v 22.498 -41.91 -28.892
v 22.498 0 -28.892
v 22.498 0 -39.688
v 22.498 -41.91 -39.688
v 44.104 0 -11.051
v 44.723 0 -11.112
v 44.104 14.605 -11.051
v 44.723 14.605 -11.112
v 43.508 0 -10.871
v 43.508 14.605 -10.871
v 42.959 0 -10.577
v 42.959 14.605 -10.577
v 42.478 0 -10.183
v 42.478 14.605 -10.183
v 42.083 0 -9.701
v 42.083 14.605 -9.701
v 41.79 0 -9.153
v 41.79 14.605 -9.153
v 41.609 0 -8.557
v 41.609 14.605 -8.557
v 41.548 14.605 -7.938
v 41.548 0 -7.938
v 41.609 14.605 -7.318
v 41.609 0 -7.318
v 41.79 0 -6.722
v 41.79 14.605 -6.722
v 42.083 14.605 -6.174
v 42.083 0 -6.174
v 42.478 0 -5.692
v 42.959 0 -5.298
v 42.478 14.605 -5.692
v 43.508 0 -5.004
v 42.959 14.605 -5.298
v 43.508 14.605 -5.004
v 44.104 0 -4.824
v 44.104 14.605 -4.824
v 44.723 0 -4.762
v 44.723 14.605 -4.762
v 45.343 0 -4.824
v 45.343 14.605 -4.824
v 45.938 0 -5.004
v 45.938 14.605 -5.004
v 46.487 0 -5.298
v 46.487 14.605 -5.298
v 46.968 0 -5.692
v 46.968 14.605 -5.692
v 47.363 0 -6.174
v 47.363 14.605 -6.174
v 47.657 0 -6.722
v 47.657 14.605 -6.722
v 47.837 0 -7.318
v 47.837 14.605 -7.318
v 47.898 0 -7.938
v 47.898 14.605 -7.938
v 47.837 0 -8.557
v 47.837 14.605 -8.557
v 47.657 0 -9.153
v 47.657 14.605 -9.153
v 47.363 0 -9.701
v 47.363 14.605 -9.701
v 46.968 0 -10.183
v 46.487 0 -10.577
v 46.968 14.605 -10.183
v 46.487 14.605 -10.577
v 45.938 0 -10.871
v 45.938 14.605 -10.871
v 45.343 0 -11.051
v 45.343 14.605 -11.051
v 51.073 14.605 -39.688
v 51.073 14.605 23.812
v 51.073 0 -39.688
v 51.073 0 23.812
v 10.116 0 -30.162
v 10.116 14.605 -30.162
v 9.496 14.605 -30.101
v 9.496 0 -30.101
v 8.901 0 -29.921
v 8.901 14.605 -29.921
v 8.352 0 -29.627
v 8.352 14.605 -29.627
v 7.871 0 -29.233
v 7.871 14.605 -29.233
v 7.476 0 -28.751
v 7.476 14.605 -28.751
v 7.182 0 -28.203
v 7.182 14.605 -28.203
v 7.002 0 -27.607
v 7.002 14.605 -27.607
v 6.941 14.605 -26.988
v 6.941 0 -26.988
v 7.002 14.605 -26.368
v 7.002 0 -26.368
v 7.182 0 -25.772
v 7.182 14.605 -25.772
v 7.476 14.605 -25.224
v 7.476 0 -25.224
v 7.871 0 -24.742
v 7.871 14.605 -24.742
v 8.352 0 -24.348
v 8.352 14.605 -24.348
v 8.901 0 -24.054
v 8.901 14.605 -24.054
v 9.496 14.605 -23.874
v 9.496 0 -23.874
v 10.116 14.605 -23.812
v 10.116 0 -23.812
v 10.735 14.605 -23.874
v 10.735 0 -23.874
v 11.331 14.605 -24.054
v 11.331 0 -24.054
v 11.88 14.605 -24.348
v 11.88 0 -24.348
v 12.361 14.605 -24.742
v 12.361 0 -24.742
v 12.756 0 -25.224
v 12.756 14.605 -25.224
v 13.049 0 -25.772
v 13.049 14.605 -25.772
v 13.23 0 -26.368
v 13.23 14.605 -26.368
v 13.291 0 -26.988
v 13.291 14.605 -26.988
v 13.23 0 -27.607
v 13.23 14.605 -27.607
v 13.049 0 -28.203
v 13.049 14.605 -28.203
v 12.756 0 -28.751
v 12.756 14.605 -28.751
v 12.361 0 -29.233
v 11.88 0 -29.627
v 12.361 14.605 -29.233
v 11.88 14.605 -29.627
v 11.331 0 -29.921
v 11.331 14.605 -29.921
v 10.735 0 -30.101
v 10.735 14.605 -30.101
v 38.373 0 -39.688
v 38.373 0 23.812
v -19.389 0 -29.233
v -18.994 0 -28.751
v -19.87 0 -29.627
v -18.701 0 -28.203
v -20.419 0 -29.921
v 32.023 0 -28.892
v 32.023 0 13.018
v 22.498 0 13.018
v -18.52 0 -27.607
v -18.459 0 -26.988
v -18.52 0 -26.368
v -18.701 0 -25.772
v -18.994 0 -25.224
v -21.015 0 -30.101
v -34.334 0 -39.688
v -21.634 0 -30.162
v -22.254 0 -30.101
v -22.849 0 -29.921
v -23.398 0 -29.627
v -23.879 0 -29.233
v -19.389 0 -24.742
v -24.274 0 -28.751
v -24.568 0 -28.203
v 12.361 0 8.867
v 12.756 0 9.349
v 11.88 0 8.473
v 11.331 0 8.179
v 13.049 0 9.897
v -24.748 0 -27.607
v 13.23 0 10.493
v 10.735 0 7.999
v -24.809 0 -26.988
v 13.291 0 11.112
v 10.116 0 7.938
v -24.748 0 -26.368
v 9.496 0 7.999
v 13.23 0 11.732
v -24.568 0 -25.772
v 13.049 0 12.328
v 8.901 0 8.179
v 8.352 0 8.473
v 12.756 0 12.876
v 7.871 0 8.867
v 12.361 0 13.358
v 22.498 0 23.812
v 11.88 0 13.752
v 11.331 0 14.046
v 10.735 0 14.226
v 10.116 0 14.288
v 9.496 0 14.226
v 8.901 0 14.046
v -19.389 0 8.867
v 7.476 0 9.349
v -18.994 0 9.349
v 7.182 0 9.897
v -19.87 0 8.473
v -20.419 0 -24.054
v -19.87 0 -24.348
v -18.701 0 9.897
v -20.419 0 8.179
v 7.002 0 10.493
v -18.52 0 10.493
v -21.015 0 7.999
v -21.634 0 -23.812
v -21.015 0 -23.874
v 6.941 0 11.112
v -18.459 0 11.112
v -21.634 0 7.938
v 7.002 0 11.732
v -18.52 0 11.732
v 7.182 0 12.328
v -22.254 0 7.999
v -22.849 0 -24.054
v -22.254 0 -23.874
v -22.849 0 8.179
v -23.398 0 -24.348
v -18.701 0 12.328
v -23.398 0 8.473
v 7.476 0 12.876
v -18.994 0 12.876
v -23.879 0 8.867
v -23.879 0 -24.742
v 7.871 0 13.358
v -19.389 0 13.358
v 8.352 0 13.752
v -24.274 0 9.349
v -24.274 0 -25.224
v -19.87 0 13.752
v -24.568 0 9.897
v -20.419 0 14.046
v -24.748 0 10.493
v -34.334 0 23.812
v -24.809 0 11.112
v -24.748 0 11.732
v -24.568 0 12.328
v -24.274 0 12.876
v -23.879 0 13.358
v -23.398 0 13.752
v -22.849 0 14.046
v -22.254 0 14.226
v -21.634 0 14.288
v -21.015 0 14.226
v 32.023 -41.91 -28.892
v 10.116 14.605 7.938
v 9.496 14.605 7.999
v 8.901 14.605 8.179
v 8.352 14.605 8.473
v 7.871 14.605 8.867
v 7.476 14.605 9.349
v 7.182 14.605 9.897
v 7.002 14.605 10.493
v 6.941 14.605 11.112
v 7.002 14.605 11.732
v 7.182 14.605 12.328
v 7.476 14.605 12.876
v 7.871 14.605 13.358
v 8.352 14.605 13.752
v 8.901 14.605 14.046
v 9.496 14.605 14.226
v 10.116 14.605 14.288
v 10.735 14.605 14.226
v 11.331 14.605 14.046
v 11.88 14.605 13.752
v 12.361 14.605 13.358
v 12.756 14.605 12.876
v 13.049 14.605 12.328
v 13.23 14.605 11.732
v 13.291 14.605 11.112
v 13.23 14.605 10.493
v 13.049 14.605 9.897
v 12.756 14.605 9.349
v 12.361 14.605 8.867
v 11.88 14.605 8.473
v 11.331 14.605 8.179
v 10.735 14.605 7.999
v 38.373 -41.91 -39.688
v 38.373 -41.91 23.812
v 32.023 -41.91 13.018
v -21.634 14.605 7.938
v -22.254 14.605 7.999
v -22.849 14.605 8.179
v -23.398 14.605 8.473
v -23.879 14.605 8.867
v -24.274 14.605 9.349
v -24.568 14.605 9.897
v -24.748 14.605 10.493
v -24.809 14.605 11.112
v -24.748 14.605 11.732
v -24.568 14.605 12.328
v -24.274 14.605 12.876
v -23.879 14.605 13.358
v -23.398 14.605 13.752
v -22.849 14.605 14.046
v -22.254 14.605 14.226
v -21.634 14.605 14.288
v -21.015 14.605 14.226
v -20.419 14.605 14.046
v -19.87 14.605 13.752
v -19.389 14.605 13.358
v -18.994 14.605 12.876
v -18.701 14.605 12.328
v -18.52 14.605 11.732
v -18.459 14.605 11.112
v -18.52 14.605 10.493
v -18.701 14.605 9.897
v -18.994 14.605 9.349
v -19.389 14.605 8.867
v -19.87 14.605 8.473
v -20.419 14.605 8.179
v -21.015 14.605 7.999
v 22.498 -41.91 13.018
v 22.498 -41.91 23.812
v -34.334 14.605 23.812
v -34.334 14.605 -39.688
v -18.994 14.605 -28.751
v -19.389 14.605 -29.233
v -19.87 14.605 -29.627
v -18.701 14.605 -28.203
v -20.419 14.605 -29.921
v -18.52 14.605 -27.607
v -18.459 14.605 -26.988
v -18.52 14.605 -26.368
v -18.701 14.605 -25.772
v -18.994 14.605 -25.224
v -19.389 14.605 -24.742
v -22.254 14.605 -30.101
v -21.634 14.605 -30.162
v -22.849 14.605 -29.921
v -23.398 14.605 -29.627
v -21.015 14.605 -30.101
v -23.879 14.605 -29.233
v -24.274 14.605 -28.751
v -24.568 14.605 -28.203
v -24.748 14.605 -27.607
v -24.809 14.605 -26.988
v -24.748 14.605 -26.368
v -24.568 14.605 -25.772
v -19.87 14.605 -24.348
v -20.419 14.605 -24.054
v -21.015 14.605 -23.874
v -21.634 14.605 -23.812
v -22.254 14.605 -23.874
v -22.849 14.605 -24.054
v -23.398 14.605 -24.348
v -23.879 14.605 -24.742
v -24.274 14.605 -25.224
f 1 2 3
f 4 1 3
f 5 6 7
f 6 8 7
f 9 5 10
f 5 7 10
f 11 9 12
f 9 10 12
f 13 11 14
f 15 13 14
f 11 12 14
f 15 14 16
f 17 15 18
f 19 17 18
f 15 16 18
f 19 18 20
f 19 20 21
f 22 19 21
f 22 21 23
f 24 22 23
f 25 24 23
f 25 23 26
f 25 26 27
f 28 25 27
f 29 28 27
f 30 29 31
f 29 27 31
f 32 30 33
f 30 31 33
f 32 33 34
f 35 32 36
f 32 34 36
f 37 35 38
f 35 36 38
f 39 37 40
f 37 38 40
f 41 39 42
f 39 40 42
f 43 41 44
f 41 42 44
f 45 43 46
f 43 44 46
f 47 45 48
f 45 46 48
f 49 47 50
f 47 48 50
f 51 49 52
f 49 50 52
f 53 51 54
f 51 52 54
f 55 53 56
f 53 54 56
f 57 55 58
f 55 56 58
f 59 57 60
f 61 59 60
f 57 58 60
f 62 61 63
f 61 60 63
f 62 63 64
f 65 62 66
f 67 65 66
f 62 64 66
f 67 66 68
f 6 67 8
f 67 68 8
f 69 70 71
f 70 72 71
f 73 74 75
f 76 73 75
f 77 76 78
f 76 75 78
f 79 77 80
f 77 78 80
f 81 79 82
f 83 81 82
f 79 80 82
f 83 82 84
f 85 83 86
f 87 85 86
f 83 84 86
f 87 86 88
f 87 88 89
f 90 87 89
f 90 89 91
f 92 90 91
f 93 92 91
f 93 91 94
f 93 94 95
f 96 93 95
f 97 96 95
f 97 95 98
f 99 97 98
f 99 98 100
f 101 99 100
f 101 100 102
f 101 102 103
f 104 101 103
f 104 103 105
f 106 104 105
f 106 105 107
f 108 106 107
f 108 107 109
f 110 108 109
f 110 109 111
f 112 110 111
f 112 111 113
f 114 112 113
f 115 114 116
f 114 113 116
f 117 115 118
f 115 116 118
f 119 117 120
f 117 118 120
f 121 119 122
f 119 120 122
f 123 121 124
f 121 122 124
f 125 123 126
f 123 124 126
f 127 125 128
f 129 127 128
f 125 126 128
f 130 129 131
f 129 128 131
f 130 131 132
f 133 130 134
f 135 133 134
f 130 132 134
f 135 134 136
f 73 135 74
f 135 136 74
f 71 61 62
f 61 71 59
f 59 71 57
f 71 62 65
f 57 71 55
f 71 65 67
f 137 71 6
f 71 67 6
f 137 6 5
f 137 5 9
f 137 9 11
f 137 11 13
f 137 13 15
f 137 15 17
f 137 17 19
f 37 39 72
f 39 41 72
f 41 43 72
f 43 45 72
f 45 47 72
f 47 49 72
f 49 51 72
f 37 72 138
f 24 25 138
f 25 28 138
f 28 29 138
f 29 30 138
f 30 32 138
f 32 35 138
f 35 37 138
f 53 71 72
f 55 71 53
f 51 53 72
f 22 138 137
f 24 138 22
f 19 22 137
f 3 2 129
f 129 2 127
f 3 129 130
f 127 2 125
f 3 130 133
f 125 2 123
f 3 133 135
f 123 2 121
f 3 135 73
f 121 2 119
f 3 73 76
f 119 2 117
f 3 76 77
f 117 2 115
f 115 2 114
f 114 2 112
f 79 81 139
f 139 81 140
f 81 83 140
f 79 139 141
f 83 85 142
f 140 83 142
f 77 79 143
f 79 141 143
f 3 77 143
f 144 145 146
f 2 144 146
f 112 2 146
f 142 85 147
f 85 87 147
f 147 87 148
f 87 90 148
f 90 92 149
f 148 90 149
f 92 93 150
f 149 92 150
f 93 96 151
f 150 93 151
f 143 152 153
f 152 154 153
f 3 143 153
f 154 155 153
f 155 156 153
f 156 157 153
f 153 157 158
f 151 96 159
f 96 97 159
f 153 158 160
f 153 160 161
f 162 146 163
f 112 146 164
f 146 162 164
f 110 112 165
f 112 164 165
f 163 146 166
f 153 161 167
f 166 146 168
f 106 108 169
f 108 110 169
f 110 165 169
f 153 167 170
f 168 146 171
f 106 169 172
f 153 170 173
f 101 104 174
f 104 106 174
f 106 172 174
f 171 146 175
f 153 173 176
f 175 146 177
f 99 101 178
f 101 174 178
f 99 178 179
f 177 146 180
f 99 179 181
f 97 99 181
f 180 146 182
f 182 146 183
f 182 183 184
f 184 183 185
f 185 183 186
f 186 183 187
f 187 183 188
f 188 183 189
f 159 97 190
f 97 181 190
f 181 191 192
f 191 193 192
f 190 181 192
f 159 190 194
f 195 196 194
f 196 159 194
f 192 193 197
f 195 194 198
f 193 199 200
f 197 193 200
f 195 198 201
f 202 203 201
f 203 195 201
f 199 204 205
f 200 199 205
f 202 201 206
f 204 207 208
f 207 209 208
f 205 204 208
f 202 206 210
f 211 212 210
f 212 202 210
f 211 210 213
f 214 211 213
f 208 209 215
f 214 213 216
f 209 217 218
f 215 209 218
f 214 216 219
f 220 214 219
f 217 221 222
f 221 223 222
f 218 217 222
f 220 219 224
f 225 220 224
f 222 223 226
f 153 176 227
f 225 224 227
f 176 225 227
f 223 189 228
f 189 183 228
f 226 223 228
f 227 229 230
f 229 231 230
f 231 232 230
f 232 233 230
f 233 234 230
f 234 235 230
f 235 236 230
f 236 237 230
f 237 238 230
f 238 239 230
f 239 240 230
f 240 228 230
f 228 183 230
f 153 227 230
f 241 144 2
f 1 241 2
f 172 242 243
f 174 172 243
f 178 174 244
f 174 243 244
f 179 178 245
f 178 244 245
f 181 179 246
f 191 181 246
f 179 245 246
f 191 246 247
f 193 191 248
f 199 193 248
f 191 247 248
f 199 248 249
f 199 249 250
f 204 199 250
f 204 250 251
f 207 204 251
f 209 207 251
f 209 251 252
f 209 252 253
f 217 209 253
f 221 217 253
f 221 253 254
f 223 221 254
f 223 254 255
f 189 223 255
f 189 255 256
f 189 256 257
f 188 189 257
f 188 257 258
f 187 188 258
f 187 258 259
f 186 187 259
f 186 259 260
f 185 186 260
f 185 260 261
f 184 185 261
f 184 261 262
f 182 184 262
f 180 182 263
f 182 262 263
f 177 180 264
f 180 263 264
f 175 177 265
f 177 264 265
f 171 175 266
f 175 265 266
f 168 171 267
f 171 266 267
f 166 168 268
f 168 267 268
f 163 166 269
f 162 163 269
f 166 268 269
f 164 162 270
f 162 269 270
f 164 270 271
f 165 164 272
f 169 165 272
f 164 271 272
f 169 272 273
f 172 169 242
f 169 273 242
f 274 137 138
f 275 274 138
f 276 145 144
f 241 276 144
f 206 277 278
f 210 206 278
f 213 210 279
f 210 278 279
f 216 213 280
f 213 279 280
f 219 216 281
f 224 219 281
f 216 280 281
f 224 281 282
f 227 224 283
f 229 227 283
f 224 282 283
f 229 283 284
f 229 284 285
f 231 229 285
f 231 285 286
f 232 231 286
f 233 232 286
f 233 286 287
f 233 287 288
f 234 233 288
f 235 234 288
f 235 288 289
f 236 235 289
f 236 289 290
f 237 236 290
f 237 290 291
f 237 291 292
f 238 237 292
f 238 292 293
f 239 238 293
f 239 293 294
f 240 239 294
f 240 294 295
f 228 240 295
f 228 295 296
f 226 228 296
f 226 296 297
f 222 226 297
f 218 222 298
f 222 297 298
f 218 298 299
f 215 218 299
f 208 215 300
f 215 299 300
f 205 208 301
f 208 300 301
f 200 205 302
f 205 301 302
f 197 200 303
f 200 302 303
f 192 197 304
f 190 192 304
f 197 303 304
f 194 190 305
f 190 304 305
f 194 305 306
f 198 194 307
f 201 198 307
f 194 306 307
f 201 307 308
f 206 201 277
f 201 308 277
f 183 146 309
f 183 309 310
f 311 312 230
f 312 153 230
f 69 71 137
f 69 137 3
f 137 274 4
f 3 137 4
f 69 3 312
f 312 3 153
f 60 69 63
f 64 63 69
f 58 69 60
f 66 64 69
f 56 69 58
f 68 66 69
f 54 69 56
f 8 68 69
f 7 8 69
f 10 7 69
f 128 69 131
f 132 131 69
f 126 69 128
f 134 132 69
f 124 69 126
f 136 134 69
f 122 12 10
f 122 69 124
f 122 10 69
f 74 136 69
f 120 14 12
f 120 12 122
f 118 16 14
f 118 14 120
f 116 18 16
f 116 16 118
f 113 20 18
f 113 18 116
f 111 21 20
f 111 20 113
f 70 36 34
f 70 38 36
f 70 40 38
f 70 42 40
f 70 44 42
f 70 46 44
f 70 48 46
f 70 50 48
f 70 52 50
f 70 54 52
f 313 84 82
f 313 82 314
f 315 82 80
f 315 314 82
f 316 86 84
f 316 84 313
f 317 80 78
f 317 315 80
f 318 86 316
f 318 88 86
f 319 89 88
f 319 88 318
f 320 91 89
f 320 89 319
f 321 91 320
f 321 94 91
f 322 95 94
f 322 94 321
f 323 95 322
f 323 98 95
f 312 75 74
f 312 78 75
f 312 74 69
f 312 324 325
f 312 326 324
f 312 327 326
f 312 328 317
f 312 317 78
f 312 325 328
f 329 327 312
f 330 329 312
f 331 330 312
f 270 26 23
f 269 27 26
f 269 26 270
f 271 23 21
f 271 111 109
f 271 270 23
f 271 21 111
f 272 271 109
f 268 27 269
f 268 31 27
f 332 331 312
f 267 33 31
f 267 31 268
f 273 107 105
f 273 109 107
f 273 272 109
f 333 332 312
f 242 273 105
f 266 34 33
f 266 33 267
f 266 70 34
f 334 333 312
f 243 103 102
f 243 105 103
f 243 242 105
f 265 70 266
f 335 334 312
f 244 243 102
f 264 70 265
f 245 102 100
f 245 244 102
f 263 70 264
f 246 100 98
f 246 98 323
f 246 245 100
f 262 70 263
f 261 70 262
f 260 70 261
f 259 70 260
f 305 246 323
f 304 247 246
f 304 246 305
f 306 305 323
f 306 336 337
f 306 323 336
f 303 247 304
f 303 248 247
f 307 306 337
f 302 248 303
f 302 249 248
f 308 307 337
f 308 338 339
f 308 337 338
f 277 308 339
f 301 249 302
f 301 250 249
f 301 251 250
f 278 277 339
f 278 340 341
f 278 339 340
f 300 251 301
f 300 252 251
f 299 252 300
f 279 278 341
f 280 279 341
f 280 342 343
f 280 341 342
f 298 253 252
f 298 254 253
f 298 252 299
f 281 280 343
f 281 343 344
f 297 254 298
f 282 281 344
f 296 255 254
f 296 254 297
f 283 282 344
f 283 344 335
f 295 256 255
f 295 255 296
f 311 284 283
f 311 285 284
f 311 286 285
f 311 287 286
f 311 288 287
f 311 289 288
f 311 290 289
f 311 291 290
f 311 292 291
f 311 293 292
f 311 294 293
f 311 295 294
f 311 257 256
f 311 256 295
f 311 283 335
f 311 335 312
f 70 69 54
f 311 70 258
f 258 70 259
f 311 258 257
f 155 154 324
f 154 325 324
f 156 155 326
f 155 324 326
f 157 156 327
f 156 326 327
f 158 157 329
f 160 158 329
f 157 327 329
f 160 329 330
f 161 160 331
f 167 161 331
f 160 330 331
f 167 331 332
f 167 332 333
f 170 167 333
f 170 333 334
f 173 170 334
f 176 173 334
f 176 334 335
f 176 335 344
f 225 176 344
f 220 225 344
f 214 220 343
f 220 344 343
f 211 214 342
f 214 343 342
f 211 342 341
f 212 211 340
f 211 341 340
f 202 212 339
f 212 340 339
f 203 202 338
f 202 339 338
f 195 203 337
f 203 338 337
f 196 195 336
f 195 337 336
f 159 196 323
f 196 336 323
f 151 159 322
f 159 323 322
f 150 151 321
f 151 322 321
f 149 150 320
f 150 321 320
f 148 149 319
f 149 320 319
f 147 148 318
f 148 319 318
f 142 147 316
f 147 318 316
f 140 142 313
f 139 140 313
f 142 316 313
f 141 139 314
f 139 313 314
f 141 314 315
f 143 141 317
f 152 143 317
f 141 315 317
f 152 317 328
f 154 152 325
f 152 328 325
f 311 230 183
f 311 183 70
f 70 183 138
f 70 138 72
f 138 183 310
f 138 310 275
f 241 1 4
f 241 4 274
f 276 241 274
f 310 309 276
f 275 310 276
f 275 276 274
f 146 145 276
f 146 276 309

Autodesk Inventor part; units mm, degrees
ref_plane "YZ Plane" through (0, 0, 0) normal (1, 0, 0) x (0, 1, 0)
ref_plane "XZ Plane" through (0, 0, 0) normal (0, 1, 0) x (-1, 0, 0)
ref_plane "XY Plane" through (0, 0, 0) normal (0, 0, 1) x (1, 0, 0)
sketch "Sketch1" plane through (0, 0, 0) normal (0, 1, 0) x (-1, 0, 0)
  line L0 (34.3343, 23.8125) -> (-51.0732, 23.8125)
  line L1 (-51.0732, 23.8125) -> (-51.0732, -39.6875)
  line L2 (-51.0732, -39.6875) -> (34.3343, -39.6875)
  line L3 (34.3343, -39.6875) -> (34.3343, 23.8125)
  point P0 (0, 0)
  dimension "d0" = 63.5
  dimension "d1" = 85.4075
extrude "Extrusion1" add sketch "Sketch1" along normal blind 14.605
sketch "Sketch2" plane through (0, 0, 0) normal (0, -1, 0) x (1, 0, 0)
  line L0 (-34.3343, 23.8125) -> (51.0732, 23.8125) projected
  line L1 (32.0232, -39.6875) -> (38.3732, -39.6875)
  line L2 (38.3732, -39.6875) -> (38.3732, 23.8125)
  line L3 (38.3732, 23.8125) -> (32.0232, 23.8125)
  line L4 (32.0232, 13.0175) -> (32.0232, -28.8925)
  line L5 (51.0732, 23.8125) -> (51.0732, -39.6875) projected
  line L6 (22.4982, -39.6875) -> (38.3732, -39.6875)
  line L7 (38.3732, -39.6875) -> (38.3732, -28.8925)
  line L8 (32.0232, -28.8925) -> (22.4982, -28.8925)
  line L9 (22.4982, -28.8925) -> (22.4982, -39.6875)
  line L10 (22.4982, 23.8125) -> (38.3732, 23.8125)
  line L11 (38.3732, 23.8125) -> (38.3732, 13.0175)
  line L12 (32.0232, 13.0175) -> (22.4982, 13.0175)
  line L13 (22.4982, 13.0175) -> (22.4982, 23.8125)
  point P0 (0, 0)
  dimension "d4" = 63.5
  dimension "d5" = 6.35
  dimension "d6" = 12.7
  dimension "d15" = 10.795
  dimension "d16" = 10.795
  dimension "d17" = 15.875
  dimension "d18" = 15.875
extrude "Extrusion3" add sketch "Sketch2" along normal blind 41.91
sketch "Sketch4" plane through (0, 0, 0) normal (0, -1, 0) x (1, 0, 0)
  line L0 (22.4982, -39.6875) -> (-34.3343, -39.6875) projected
  line L1 (-34.3343, -39.6875) -> (-34.3343, 23.8125) projected
  line L2 (-34.3343, 23.8125) -> (22.4982, 23.8125) projected
  point P0 (0, 0)
  point P1 (-21.6343, -26.9875)
  point P2 (-21.6343, 11.1125)
  point P3 (10.1157, 11.1125)
  point P4 (10.1157, -26.9875)
  dimension "d21" = 12.7
  dimension "d22" = 12.7
  dimension "d23" = 12.7
  dimension "d24" = 12.7
  dimension "d25" = 12.7
  dimension "d26" = 12.7
  dimension "d27" = 44.45
  dimension "d28" = 44.45
hole "Hole1" at (-21.6343, 0, -26.9875) at (-21.6343, 0, 11.1125) at (10.1157, 0, 11.1125) at (10.1157, 0, -26.9875) direction (0, 1, 0) diameter 6.35 end through all
sketch "Sketch5" plane through (0, 0, 0) normal (0, -1, 0) x (1, 0, 0)
  line L0 (38.3732, -39.6875) -> (38.3732, 23.8125) projected
  line L1 (51.0732, 23.8125) -> (51.0732, -39.6875) projected
  line L2 (38.3732, 23.8125) -> (51.0732, 23.8125) projected
  point P0 (0, 0)
  point P1 (44.7232, -7.9375)
  dimension "d36" = 6.35
  dimension "d38" = 31.75
hole "Hole2" at (44.7232, 0, -7.9375) direction (0, 1, 0) diameter 6.35 end through all
equation "\"d23\" = d22"
equation "\"d24\" = d21"
equation "\"d25\" = d21"
equation "\"d26\" = d21"
equation "\"d28\" = d27"
properties part number "Vertical sedder motor spacer"
